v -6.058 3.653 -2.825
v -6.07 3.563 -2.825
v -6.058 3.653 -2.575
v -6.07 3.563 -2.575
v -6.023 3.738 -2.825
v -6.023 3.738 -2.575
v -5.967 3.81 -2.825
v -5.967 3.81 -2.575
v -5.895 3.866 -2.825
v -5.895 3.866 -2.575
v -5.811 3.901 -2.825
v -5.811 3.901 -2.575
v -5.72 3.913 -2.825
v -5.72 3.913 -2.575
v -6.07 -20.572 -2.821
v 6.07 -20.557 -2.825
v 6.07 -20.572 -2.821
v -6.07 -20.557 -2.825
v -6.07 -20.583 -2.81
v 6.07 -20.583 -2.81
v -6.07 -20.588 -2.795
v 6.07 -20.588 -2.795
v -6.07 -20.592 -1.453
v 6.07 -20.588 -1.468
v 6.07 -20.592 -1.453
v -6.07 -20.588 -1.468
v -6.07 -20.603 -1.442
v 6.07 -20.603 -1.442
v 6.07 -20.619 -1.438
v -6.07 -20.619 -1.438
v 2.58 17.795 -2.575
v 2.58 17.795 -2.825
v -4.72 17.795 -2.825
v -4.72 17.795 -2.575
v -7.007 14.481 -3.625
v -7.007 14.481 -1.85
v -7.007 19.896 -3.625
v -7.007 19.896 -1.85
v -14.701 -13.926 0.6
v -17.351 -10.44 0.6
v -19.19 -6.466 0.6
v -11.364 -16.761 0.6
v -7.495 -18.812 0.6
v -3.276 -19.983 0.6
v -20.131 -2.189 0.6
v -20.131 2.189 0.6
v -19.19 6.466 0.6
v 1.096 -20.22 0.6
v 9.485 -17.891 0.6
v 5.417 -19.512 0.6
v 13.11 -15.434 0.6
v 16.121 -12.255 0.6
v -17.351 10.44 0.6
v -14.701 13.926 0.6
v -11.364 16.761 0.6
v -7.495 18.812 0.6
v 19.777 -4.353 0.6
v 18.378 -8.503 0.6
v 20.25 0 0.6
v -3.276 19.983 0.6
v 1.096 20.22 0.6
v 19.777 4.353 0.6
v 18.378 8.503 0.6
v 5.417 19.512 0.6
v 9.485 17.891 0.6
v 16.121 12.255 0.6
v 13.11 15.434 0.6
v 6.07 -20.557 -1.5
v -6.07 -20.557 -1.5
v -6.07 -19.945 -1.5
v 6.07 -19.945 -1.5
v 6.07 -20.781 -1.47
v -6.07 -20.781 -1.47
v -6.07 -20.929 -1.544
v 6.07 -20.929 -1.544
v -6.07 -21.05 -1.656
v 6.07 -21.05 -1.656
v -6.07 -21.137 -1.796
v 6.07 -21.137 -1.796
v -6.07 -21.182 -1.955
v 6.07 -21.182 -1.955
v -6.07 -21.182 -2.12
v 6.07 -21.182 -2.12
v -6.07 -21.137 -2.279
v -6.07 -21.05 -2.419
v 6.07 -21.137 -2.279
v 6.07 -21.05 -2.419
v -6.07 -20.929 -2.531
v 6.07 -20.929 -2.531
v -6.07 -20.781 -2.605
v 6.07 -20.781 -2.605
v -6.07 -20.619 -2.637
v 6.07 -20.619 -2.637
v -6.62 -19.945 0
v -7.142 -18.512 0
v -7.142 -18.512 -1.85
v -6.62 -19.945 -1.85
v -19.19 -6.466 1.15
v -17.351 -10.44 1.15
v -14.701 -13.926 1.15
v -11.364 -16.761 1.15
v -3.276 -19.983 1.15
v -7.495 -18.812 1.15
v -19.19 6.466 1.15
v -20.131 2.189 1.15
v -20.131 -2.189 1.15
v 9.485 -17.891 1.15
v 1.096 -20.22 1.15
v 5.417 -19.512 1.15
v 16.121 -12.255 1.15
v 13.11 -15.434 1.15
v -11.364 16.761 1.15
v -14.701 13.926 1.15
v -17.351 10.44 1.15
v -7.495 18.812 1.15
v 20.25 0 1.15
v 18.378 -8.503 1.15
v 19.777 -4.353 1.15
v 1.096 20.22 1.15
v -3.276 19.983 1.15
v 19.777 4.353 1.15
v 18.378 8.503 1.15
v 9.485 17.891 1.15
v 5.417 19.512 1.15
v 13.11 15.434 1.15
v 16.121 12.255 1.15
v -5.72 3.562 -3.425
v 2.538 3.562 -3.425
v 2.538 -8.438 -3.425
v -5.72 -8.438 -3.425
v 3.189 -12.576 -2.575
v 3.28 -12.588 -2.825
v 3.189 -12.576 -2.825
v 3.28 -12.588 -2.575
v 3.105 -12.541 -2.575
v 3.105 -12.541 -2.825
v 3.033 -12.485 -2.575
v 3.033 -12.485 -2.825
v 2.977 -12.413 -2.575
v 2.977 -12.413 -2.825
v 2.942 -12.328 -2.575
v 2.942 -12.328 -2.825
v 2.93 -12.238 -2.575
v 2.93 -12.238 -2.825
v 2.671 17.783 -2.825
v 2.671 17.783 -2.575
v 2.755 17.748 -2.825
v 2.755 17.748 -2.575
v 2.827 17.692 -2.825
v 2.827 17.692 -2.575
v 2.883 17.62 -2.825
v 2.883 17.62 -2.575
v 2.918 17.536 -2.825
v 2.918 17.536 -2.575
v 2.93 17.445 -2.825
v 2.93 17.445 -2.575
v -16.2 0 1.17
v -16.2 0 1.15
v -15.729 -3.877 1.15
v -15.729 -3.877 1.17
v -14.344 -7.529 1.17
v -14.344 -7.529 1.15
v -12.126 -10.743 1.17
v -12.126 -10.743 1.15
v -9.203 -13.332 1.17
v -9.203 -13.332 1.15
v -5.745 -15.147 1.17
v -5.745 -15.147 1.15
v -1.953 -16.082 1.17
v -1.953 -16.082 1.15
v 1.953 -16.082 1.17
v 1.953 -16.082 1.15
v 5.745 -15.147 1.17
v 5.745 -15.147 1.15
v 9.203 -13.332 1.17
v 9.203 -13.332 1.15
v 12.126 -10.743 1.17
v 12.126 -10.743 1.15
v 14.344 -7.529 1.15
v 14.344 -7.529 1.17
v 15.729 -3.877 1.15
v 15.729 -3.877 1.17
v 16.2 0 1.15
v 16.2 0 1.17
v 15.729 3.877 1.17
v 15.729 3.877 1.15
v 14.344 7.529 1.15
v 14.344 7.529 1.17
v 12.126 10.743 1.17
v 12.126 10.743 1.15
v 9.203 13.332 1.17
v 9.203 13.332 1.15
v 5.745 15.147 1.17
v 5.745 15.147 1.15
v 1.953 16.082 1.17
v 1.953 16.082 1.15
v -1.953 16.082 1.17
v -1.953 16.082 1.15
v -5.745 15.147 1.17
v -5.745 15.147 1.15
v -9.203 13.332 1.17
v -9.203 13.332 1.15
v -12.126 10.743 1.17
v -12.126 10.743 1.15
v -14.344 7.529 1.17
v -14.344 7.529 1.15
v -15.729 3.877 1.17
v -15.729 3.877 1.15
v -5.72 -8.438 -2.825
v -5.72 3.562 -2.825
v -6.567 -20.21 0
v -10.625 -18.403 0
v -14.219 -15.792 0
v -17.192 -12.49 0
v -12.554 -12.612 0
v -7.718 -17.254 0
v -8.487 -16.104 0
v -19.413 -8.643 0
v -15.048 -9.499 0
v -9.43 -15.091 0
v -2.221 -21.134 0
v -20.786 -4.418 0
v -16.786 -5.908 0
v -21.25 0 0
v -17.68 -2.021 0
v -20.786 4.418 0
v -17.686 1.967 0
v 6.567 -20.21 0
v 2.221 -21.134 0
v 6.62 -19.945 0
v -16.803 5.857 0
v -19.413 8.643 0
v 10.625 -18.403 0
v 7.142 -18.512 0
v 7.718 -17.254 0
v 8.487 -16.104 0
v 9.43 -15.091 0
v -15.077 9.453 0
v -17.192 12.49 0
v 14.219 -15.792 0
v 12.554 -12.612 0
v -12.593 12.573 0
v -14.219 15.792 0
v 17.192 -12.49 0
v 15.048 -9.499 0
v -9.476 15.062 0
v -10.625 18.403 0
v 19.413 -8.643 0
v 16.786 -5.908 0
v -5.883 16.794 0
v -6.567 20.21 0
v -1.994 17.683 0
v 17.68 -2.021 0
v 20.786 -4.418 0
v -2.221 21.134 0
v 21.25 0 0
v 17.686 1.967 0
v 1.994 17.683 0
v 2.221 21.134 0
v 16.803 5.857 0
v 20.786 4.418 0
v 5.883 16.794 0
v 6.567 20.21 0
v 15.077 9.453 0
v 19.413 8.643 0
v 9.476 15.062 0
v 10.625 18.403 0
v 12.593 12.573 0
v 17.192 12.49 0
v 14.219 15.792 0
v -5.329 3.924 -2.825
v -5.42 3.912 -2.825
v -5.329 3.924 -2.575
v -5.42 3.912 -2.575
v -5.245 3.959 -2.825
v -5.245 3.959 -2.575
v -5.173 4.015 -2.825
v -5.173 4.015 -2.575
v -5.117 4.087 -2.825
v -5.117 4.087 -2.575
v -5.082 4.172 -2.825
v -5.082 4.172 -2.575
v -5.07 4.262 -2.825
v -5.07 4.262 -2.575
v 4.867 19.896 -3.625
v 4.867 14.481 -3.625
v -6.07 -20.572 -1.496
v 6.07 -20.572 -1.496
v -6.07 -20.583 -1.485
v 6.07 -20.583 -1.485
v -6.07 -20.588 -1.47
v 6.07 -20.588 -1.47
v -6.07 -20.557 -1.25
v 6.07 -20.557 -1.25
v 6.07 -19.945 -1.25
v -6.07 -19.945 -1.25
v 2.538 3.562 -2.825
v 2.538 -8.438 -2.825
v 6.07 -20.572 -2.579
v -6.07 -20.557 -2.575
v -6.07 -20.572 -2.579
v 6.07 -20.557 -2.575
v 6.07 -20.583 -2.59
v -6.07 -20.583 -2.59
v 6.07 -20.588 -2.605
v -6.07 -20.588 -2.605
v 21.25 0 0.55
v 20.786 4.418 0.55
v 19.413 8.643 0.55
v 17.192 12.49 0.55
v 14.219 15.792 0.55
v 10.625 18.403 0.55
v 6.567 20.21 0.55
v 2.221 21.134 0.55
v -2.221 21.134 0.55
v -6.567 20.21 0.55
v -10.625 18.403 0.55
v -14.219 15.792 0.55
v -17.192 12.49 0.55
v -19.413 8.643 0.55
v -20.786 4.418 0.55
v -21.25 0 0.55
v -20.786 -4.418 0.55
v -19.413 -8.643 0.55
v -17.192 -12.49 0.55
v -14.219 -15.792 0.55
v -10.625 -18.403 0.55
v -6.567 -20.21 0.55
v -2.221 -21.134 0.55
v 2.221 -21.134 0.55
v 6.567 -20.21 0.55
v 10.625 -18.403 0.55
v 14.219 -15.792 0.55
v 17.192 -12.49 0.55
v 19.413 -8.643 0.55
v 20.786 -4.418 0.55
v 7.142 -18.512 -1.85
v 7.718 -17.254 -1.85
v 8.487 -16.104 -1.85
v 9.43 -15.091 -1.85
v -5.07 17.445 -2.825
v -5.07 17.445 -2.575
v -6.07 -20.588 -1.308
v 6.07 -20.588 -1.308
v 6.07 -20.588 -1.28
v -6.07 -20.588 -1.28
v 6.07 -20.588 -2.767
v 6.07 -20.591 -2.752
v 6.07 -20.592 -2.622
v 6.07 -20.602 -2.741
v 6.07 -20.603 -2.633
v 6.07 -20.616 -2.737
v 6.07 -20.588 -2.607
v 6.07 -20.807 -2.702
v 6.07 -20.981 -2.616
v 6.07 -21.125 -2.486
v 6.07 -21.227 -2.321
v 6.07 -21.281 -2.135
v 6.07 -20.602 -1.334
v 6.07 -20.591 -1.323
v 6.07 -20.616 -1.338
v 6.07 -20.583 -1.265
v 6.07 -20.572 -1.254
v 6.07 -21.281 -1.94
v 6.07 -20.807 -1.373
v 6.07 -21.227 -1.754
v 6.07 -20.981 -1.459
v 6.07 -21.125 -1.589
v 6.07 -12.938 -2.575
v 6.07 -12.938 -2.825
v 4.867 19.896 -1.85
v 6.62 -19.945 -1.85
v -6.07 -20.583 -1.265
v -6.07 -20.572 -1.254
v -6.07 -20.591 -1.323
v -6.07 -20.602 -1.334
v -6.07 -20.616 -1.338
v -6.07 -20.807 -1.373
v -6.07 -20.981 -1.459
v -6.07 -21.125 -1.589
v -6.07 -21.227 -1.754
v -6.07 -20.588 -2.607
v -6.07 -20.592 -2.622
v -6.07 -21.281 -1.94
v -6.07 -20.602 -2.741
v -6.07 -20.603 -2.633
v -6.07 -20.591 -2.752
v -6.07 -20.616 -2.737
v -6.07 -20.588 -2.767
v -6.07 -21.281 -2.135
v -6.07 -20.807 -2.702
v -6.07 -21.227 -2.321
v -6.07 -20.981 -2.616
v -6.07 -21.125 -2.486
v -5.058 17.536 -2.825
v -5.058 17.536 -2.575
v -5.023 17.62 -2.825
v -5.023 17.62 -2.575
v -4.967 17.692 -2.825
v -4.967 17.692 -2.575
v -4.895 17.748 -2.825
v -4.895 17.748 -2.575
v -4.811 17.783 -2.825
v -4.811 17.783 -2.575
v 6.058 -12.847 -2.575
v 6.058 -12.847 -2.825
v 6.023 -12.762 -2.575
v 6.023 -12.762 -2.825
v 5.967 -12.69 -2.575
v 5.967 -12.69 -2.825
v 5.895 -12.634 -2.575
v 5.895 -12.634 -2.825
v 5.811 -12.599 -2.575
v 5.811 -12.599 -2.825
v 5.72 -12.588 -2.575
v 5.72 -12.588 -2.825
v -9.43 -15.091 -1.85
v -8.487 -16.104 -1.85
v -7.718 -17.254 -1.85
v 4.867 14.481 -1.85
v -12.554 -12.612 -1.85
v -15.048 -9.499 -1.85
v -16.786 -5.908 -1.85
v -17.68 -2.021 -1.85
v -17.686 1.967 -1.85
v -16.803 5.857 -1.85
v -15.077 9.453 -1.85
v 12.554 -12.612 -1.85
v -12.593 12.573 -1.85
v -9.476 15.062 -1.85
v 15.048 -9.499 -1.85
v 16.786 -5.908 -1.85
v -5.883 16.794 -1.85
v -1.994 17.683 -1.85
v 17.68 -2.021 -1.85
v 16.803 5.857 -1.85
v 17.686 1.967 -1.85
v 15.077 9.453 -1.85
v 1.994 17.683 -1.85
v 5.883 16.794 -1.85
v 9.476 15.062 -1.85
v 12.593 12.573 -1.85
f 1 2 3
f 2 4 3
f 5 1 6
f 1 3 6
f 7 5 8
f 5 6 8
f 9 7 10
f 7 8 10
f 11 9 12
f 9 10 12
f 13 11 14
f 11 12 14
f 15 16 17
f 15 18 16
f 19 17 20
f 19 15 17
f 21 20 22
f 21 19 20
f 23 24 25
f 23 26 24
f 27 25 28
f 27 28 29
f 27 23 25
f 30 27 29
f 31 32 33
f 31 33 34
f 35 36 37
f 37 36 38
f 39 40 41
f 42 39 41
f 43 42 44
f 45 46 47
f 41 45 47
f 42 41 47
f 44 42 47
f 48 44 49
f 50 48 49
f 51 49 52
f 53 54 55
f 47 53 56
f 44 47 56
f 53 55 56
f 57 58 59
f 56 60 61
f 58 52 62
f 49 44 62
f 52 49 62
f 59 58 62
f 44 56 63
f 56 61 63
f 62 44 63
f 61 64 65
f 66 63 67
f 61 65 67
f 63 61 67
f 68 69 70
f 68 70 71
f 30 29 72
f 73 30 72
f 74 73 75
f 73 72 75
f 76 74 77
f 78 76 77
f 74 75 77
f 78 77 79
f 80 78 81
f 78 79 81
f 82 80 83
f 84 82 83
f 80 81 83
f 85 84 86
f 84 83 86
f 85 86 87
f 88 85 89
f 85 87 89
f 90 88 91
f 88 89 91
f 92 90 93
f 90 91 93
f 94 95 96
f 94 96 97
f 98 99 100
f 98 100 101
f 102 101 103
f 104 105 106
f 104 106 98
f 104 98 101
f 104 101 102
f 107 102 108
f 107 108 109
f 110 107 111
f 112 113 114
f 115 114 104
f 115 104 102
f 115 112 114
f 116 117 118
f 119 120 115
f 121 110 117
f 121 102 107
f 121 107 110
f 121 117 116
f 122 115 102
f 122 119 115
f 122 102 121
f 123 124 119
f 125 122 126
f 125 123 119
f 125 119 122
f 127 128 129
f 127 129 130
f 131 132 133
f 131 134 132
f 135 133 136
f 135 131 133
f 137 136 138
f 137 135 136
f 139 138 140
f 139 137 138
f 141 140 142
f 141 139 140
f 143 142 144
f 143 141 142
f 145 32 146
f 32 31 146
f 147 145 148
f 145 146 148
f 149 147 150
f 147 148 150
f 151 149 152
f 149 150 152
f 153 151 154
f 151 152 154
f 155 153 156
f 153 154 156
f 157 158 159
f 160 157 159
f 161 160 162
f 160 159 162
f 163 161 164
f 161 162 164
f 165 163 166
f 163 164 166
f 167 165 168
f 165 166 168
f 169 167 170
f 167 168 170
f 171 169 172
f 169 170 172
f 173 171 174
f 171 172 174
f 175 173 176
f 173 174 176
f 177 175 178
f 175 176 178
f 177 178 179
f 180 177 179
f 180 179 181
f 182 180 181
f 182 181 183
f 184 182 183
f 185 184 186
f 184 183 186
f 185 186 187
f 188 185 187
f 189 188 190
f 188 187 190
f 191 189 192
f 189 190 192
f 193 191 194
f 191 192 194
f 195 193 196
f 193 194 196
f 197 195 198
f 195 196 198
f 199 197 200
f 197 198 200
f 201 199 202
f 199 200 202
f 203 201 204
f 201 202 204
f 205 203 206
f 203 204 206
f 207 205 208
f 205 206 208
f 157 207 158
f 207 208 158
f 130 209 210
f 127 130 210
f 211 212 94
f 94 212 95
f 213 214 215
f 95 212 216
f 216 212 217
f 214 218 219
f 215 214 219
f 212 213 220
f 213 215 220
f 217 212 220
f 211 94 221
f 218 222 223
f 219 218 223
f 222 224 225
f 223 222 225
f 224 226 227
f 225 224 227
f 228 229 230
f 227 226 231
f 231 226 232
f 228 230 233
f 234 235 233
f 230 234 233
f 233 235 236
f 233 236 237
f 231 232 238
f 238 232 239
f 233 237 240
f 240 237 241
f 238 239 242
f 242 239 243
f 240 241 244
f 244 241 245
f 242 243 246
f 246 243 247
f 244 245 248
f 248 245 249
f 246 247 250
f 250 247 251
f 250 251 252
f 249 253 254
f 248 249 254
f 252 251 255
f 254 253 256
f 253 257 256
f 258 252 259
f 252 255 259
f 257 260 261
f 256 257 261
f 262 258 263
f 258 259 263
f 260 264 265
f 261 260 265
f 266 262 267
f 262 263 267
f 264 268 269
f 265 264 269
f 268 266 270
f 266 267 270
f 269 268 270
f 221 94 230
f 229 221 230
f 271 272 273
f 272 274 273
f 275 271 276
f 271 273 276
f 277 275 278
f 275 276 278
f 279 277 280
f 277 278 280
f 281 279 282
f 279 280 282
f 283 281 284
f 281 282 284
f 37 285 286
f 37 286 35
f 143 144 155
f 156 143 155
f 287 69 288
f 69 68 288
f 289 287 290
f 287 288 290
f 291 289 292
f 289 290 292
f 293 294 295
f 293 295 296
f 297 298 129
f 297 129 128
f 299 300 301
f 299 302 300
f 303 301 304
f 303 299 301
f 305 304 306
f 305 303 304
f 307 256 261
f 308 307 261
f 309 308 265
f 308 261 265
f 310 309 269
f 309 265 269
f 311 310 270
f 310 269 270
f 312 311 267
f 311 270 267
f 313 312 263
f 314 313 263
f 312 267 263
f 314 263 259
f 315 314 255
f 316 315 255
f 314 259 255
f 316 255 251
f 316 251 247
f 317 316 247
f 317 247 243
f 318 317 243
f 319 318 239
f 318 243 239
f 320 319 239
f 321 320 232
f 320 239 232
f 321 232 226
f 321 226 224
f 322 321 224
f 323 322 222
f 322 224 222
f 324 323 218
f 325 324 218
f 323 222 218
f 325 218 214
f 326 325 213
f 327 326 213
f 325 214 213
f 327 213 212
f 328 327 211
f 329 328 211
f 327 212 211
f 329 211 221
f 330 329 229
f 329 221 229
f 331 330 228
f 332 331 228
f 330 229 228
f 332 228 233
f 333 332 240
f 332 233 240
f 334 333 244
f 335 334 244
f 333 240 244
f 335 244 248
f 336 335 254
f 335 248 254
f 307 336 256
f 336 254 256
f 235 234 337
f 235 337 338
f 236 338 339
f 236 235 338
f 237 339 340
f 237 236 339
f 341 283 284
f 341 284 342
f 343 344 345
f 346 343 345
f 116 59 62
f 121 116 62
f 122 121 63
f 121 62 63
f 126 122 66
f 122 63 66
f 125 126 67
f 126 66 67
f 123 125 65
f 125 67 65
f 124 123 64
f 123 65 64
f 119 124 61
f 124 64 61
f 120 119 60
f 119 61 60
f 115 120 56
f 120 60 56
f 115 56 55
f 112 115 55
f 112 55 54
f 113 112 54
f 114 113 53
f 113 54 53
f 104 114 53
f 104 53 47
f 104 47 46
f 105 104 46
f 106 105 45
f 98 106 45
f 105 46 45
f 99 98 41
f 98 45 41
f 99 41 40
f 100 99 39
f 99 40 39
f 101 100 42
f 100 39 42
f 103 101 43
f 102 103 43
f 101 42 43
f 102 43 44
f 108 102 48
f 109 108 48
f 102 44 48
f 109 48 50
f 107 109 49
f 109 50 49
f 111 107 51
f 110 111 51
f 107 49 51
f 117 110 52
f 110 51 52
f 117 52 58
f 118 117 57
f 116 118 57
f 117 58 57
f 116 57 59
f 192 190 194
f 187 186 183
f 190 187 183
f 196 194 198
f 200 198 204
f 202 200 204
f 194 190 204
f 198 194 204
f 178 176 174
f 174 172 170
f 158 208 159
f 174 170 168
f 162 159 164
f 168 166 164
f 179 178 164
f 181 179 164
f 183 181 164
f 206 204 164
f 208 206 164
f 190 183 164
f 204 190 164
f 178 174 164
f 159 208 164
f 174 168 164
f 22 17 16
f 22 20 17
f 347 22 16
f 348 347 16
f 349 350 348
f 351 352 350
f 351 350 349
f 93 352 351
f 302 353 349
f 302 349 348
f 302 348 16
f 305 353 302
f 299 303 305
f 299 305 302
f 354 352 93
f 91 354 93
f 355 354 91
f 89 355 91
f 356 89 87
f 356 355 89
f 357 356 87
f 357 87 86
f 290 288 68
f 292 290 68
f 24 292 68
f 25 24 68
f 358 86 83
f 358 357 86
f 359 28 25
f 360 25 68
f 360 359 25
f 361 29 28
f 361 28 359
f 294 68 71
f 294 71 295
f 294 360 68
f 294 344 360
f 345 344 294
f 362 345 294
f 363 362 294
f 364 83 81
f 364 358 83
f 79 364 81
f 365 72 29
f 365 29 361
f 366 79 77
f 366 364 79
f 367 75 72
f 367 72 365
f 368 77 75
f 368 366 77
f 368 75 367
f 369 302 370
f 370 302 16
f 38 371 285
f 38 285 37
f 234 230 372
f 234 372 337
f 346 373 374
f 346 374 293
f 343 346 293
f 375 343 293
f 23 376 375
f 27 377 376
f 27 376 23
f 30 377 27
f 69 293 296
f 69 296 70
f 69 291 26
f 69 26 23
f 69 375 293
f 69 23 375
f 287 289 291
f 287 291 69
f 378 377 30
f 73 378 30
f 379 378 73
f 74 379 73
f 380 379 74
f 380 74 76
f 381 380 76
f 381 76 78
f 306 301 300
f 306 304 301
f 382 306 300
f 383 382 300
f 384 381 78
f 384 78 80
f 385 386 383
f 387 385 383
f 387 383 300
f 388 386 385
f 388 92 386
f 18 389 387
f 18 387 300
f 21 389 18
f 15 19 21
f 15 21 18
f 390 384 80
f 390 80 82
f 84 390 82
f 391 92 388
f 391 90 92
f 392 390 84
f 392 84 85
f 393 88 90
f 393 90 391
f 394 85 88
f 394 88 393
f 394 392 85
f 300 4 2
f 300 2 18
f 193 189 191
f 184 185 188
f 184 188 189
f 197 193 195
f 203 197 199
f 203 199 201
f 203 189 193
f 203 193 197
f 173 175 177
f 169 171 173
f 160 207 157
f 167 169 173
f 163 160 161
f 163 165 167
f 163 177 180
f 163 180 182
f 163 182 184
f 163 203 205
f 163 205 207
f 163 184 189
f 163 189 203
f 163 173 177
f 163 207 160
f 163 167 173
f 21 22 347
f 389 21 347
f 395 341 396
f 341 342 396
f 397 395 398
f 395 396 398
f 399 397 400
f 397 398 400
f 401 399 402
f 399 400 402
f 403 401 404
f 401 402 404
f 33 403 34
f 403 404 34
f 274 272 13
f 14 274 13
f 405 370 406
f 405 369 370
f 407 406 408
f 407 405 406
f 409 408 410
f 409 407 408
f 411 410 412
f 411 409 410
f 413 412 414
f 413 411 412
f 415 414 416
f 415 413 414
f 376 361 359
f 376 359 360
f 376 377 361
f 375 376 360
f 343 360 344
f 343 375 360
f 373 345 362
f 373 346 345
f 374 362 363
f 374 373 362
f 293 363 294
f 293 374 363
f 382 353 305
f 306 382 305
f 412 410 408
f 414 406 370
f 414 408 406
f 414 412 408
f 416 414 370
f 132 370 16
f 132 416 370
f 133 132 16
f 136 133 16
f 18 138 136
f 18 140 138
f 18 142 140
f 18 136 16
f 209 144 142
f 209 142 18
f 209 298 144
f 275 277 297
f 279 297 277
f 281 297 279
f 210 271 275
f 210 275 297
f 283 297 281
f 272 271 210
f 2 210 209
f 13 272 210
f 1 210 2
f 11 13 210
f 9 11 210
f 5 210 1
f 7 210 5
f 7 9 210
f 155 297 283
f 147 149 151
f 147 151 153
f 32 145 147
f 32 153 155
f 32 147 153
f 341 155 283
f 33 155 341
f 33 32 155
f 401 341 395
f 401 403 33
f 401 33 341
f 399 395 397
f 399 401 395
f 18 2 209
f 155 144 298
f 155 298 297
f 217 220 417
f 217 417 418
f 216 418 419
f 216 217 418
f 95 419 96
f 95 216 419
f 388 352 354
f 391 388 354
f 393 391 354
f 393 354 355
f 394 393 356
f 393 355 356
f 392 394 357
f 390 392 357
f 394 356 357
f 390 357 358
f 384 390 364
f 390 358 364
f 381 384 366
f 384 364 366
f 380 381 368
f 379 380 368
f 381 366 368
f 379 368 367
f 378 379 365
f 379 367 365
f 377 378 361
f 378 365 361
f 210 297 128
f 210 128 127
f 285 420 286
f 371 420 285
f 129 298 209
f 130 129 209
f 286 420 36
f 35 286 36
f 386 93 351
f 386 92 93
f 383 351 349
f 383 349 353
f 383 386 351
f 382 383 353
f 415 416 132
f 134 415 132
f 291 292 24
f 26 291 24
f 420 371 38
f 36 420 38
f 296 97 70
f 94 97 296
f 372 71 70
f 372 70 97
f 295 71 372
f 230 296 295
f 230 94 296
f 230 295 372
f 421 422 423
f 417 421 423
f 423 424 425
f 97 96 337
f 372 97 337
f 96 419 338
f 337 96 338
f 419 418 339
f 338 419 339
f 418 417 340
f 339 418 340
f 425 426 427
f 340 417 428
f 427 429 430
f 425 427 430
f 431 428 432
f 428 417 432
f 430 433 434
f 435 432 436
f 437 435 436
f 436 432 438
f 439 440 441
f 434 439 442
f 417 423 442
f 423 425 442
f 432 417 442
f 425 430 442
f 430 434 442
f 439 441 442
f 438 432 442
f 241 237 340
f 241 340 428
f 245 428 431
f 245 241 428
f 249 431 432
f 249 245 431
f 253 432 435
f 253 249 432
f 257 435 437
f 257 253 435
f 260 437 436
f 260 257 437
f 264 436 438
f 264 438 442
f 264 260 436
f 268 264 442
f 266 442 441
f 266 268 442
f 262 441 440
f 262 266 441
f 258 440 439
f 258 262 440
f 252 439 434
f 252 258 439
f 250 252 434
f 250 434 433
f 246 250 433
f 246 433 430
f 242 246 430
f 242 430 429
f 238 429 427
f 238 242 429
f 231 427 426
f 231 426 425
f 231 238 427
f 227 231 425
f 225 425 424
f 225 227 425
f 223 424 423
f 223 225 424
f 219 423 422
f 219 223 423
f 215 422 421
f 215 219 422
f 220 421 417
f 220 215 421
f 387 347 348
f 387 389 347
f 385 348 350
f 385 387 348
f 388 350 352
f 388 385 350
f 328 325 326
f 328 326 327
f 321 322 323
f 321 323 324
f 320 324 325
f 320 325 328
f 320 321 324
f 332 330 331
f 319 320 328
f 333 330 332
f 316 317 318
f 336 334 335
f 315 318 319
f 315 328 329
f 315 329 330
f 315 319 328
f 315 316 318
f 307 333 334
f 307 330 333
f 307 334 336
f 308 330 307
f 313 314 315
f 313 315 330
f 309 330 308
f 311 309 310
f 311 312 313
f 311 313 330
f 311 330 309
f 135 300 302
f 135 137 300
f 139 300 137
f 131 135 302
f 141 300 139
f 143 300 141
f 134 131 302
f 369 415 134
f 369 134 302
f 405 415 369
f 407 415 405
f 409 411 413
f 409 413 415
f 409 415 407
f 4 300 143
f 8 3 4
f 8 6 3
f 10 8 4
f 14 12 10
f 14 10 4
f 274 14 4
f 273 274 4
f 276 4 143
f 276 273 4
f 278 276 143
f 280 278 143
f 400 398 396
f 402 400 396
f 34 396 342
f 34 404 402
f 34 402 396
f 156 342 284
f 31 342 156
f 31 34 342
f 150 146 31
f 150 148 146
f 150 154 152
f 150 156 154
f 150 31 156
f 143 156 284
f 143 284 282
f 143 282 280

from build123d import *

# Parameters (mm, degrees)
SKETCH_1_R           = 21.25
EXTRUDE_2_DEPTH      = 0.55
EXTRUDE_START        = 0.05
SKETCH_4_R           = 20.25
EXTRUDE_5_DEPTH      = 0.55
EXTRUDE_6_DEPTH      = 1.85
SKETCH_13_W          = 12.14
SKETCH_13_H          = 0.25
SKETCH_15_W          = 1
SKETCH_15_H          = 13.8825
SKETCH_15_W_2        = 3.14
SKETCH_15_H_2        = 30.3825
CUT_EXTRUDE_1_DEPTH  = 0.25
FILLET_3_R           = 0.35
CUT_EXTRUDE_2_DEPTH  = 12.14
FILLET_4_R           = 0.03
EXTRUDE_9_DEPTH      = 0.8
EXTRUDE_9_DEPTH_BACK = 0.975
SKETCH_21_W          = 11.873363282
SKETCH_21_H          = 5.414826094
SKETCH_22_W          = 8.257682068
SKETCH_22_H          = 12
EXTRUDE_10_DEPTH     = 0.6
SKETCH_5_R           = 16.2
EXTRUDE_11_DEPTH     = 0.02


with BuildPart() as part:
    # 草图1 → 凸台-拉伸2 (new body)
    with BuildSketch(Plane.XY):
        Circle(SKETCH_1_R)
    extrude(amount=EXTRUDE_2_DEPTH)

    # 草图12 → 凸台-拉伸6 (add)
    with BuildSketch(Plane(origin=(0, 0, 0), x_dir=(-1, 0, 0), z_dir=(0, 0, -1))):
        with BuildLine():
            ThreePointArc((-7.141650725, -18.511776412), (-8.079107583, -16.663144613), (-9.429913307, -15.091015871))
            ThreePointArc((-9.429913307, -15.091015871), (0, 17.795), (9.429913307, -15.091015871))
            ThreePointArc((9.429913307, -15.091015871), (8.079107583, -16.663144613), (7.141650725, -18.511776412))
            Line((7.141650725, -18.511776412), (6.62, -19.945))
            Line((6.62, -19.945), (-6.62, -19.945))
            Line((-6.62, -19.945), (-7.141650725, -18.511776412))
        make_face()
    extrude(amount=EXTRUDE_6_DEPTH)

    # 扫描2: sweep along a path in 草图14
    with BuildLine(Plane(origin=(0, 0, 0), x_dir=(0, 0, -1), z_dir=(1, 0, 0))) as sweep_2_path:
        Line((1.375, -19.945), (1.375, -20.5875))
        ThreePointArc((1.375, -20.5875), (2.0375, -21.25), (2.7, -20.5875))
        Line((2.7, -20.5875), (2.7, 17.795))
    # 草图13 → 扫描2 (sweep)
    with BuildSketch(Plane.XZ.offset(19.945)):
        with Locations((0, -1.375)):
            Rectangle(SKETCH_13_W, SKETCH_13_H)
    sweep(path=sweep_2_path.line)

    # 草图15 → 切除-拉伸1 (cut)
    with BuildSketch(Plane(origin=(0, 0, -2.825), x_dir=(-1, 0, 0), z_dir=(0, 0, -1))):
        with Locations((5.57, 10.85375)):
            Rectangle(SKETCH_15_W, SKETCH_15_H)
        with Locations((-4.5, 2.60375)):
            Rectangle(SKETCH_15_W_2, SKETCH_15_H_2)
    extrude(amount=-CUT_EXTRUDE_1_DEPTH, mode=Mode.SUBTRACT)

    # 圆角3
    fillet_3_edges = [part.edges().sort_by_distance(p)[0] for p in [
        (-6.07, 3.9125, -2.7),
        (-5.07, 17.795, -2.7),
        (-5.07, 3.9125, -2.7),
        (2.93, 17.795, -2.7),
        (6.07, -12.5875, -2.7),
        (2.93, -12.5875, -2.7),
    ]]
    fillet(fillet_3_edges, radius=FILLET_3_R)

    # 草图18 → 切除-拉伸2 (cut)
    with BuildSketch(Plane(origin=(6.07, 0, 0), x_dir=(0, 0, -1), z_dir=(1, 0, 0))):
        with BuildLine():
            ThreePointArc((1.4375, -20.5875), (2.0375, -21.1875), (2.6375, -20.5875))
            Line((2.6375, -20.5875), (2.575, -20.5875))
            ThreePointArc((2.575, -20.5875), (2.0375, -21.125), (1.5, -20.5875))
            Line((1.5, -20.5875), (1.4375, -20.5875))
        make_face()
        with BuildLine():
            ThreePointArc((1.25, -20.5875), (2.0375, -21.375), (2.825, -20.5875))
            Line((2.825, -20.5875), (2.7375, -20.5875))
            ThreePointArc((2.7375, -20.5875), (2.0375, -21.2875), (1.3375, -20.5875))
            Line((1.3375, -20.5875), (1.25, -20.5875))
        make_face()
    extrude(amount=-CUT_EXTRUDE_2_DEPTH, mode=Mode.SUBTRACT)

    # 圆角4
    fillet_4_edges = [part.edges().sort_by_distance(p)[0] for p in [
        (0, -20.5875, -2.7375),
        (0, -20.5875, -1.3375),
        (0, -20.5875, -1.4375),
        (0, -20.5875, -2.6375),
        (0, -20.5875, -1.5),
        (0, -20.5875, -1.25),
        (0, -20.5875, -2.575),
        (0, -20.5875, -2.825),
    ]]
    fillet(fillet_4_edges, radius=FILLET_4_R)

    # 草图22 → 凸台-拉伸10 (add)
    with BuildSketch(Plane(origin=(0, 0, -2.825), x_dir=(-1, 0, 0), z_dir=(0, 0, -1))):
        with Locations((1.591158966, -2.4375)):
            Rectangle(SKETCH_22_W, SKETCH_22_H)
    extrude(amount=EXTRUDE_10_DEPTH)


with BuildPart() as body_2:
    # 草图4 → 凸台-拉伸5 (new body)
    with BuildSketch(Plane.XY.offset(0.55).offset(EXTRUDE_START)):
        Circle(SKETCH_4_R)
    extrude(amount=EXTRUDE_5_DEPTH)


with BuildPart() as body_3:
    # 草图21 → 凸台-拉伸9 (new, two sides: drawn at the far end of the back side and taken through both)
    with BuildSketch(Plane(origin=(0, 0, -2.825), x_dir=(-1, 0, 0), z_dir=(0, 0, -1)).offset(-EXTRUDE_9_DEPTH_BACK)):
        with Locations((1.07, 17.188379125)):
            Rectangle(SKETCH_21_W, SKETCH_21_H)
    extrude(amount=EXTRUDE_9_DEPTH + EXTRUDE_9_DEPTH_BACK)


with BuildPart() as body_4:
    # 草图5 → 凸台-拉伸11 (new body)
    with BuildSketch(Plane.XY.offset(1.15)):
        with Locations(Location((0, 0, 0), (0, 0, 180))):
            Circle(SKETCH_5_R)
    extrude(amount=EXTRUDE_11_DEPTH)


solid = Compound([part.part, body_2.part, body_3.part, body_4.part])
